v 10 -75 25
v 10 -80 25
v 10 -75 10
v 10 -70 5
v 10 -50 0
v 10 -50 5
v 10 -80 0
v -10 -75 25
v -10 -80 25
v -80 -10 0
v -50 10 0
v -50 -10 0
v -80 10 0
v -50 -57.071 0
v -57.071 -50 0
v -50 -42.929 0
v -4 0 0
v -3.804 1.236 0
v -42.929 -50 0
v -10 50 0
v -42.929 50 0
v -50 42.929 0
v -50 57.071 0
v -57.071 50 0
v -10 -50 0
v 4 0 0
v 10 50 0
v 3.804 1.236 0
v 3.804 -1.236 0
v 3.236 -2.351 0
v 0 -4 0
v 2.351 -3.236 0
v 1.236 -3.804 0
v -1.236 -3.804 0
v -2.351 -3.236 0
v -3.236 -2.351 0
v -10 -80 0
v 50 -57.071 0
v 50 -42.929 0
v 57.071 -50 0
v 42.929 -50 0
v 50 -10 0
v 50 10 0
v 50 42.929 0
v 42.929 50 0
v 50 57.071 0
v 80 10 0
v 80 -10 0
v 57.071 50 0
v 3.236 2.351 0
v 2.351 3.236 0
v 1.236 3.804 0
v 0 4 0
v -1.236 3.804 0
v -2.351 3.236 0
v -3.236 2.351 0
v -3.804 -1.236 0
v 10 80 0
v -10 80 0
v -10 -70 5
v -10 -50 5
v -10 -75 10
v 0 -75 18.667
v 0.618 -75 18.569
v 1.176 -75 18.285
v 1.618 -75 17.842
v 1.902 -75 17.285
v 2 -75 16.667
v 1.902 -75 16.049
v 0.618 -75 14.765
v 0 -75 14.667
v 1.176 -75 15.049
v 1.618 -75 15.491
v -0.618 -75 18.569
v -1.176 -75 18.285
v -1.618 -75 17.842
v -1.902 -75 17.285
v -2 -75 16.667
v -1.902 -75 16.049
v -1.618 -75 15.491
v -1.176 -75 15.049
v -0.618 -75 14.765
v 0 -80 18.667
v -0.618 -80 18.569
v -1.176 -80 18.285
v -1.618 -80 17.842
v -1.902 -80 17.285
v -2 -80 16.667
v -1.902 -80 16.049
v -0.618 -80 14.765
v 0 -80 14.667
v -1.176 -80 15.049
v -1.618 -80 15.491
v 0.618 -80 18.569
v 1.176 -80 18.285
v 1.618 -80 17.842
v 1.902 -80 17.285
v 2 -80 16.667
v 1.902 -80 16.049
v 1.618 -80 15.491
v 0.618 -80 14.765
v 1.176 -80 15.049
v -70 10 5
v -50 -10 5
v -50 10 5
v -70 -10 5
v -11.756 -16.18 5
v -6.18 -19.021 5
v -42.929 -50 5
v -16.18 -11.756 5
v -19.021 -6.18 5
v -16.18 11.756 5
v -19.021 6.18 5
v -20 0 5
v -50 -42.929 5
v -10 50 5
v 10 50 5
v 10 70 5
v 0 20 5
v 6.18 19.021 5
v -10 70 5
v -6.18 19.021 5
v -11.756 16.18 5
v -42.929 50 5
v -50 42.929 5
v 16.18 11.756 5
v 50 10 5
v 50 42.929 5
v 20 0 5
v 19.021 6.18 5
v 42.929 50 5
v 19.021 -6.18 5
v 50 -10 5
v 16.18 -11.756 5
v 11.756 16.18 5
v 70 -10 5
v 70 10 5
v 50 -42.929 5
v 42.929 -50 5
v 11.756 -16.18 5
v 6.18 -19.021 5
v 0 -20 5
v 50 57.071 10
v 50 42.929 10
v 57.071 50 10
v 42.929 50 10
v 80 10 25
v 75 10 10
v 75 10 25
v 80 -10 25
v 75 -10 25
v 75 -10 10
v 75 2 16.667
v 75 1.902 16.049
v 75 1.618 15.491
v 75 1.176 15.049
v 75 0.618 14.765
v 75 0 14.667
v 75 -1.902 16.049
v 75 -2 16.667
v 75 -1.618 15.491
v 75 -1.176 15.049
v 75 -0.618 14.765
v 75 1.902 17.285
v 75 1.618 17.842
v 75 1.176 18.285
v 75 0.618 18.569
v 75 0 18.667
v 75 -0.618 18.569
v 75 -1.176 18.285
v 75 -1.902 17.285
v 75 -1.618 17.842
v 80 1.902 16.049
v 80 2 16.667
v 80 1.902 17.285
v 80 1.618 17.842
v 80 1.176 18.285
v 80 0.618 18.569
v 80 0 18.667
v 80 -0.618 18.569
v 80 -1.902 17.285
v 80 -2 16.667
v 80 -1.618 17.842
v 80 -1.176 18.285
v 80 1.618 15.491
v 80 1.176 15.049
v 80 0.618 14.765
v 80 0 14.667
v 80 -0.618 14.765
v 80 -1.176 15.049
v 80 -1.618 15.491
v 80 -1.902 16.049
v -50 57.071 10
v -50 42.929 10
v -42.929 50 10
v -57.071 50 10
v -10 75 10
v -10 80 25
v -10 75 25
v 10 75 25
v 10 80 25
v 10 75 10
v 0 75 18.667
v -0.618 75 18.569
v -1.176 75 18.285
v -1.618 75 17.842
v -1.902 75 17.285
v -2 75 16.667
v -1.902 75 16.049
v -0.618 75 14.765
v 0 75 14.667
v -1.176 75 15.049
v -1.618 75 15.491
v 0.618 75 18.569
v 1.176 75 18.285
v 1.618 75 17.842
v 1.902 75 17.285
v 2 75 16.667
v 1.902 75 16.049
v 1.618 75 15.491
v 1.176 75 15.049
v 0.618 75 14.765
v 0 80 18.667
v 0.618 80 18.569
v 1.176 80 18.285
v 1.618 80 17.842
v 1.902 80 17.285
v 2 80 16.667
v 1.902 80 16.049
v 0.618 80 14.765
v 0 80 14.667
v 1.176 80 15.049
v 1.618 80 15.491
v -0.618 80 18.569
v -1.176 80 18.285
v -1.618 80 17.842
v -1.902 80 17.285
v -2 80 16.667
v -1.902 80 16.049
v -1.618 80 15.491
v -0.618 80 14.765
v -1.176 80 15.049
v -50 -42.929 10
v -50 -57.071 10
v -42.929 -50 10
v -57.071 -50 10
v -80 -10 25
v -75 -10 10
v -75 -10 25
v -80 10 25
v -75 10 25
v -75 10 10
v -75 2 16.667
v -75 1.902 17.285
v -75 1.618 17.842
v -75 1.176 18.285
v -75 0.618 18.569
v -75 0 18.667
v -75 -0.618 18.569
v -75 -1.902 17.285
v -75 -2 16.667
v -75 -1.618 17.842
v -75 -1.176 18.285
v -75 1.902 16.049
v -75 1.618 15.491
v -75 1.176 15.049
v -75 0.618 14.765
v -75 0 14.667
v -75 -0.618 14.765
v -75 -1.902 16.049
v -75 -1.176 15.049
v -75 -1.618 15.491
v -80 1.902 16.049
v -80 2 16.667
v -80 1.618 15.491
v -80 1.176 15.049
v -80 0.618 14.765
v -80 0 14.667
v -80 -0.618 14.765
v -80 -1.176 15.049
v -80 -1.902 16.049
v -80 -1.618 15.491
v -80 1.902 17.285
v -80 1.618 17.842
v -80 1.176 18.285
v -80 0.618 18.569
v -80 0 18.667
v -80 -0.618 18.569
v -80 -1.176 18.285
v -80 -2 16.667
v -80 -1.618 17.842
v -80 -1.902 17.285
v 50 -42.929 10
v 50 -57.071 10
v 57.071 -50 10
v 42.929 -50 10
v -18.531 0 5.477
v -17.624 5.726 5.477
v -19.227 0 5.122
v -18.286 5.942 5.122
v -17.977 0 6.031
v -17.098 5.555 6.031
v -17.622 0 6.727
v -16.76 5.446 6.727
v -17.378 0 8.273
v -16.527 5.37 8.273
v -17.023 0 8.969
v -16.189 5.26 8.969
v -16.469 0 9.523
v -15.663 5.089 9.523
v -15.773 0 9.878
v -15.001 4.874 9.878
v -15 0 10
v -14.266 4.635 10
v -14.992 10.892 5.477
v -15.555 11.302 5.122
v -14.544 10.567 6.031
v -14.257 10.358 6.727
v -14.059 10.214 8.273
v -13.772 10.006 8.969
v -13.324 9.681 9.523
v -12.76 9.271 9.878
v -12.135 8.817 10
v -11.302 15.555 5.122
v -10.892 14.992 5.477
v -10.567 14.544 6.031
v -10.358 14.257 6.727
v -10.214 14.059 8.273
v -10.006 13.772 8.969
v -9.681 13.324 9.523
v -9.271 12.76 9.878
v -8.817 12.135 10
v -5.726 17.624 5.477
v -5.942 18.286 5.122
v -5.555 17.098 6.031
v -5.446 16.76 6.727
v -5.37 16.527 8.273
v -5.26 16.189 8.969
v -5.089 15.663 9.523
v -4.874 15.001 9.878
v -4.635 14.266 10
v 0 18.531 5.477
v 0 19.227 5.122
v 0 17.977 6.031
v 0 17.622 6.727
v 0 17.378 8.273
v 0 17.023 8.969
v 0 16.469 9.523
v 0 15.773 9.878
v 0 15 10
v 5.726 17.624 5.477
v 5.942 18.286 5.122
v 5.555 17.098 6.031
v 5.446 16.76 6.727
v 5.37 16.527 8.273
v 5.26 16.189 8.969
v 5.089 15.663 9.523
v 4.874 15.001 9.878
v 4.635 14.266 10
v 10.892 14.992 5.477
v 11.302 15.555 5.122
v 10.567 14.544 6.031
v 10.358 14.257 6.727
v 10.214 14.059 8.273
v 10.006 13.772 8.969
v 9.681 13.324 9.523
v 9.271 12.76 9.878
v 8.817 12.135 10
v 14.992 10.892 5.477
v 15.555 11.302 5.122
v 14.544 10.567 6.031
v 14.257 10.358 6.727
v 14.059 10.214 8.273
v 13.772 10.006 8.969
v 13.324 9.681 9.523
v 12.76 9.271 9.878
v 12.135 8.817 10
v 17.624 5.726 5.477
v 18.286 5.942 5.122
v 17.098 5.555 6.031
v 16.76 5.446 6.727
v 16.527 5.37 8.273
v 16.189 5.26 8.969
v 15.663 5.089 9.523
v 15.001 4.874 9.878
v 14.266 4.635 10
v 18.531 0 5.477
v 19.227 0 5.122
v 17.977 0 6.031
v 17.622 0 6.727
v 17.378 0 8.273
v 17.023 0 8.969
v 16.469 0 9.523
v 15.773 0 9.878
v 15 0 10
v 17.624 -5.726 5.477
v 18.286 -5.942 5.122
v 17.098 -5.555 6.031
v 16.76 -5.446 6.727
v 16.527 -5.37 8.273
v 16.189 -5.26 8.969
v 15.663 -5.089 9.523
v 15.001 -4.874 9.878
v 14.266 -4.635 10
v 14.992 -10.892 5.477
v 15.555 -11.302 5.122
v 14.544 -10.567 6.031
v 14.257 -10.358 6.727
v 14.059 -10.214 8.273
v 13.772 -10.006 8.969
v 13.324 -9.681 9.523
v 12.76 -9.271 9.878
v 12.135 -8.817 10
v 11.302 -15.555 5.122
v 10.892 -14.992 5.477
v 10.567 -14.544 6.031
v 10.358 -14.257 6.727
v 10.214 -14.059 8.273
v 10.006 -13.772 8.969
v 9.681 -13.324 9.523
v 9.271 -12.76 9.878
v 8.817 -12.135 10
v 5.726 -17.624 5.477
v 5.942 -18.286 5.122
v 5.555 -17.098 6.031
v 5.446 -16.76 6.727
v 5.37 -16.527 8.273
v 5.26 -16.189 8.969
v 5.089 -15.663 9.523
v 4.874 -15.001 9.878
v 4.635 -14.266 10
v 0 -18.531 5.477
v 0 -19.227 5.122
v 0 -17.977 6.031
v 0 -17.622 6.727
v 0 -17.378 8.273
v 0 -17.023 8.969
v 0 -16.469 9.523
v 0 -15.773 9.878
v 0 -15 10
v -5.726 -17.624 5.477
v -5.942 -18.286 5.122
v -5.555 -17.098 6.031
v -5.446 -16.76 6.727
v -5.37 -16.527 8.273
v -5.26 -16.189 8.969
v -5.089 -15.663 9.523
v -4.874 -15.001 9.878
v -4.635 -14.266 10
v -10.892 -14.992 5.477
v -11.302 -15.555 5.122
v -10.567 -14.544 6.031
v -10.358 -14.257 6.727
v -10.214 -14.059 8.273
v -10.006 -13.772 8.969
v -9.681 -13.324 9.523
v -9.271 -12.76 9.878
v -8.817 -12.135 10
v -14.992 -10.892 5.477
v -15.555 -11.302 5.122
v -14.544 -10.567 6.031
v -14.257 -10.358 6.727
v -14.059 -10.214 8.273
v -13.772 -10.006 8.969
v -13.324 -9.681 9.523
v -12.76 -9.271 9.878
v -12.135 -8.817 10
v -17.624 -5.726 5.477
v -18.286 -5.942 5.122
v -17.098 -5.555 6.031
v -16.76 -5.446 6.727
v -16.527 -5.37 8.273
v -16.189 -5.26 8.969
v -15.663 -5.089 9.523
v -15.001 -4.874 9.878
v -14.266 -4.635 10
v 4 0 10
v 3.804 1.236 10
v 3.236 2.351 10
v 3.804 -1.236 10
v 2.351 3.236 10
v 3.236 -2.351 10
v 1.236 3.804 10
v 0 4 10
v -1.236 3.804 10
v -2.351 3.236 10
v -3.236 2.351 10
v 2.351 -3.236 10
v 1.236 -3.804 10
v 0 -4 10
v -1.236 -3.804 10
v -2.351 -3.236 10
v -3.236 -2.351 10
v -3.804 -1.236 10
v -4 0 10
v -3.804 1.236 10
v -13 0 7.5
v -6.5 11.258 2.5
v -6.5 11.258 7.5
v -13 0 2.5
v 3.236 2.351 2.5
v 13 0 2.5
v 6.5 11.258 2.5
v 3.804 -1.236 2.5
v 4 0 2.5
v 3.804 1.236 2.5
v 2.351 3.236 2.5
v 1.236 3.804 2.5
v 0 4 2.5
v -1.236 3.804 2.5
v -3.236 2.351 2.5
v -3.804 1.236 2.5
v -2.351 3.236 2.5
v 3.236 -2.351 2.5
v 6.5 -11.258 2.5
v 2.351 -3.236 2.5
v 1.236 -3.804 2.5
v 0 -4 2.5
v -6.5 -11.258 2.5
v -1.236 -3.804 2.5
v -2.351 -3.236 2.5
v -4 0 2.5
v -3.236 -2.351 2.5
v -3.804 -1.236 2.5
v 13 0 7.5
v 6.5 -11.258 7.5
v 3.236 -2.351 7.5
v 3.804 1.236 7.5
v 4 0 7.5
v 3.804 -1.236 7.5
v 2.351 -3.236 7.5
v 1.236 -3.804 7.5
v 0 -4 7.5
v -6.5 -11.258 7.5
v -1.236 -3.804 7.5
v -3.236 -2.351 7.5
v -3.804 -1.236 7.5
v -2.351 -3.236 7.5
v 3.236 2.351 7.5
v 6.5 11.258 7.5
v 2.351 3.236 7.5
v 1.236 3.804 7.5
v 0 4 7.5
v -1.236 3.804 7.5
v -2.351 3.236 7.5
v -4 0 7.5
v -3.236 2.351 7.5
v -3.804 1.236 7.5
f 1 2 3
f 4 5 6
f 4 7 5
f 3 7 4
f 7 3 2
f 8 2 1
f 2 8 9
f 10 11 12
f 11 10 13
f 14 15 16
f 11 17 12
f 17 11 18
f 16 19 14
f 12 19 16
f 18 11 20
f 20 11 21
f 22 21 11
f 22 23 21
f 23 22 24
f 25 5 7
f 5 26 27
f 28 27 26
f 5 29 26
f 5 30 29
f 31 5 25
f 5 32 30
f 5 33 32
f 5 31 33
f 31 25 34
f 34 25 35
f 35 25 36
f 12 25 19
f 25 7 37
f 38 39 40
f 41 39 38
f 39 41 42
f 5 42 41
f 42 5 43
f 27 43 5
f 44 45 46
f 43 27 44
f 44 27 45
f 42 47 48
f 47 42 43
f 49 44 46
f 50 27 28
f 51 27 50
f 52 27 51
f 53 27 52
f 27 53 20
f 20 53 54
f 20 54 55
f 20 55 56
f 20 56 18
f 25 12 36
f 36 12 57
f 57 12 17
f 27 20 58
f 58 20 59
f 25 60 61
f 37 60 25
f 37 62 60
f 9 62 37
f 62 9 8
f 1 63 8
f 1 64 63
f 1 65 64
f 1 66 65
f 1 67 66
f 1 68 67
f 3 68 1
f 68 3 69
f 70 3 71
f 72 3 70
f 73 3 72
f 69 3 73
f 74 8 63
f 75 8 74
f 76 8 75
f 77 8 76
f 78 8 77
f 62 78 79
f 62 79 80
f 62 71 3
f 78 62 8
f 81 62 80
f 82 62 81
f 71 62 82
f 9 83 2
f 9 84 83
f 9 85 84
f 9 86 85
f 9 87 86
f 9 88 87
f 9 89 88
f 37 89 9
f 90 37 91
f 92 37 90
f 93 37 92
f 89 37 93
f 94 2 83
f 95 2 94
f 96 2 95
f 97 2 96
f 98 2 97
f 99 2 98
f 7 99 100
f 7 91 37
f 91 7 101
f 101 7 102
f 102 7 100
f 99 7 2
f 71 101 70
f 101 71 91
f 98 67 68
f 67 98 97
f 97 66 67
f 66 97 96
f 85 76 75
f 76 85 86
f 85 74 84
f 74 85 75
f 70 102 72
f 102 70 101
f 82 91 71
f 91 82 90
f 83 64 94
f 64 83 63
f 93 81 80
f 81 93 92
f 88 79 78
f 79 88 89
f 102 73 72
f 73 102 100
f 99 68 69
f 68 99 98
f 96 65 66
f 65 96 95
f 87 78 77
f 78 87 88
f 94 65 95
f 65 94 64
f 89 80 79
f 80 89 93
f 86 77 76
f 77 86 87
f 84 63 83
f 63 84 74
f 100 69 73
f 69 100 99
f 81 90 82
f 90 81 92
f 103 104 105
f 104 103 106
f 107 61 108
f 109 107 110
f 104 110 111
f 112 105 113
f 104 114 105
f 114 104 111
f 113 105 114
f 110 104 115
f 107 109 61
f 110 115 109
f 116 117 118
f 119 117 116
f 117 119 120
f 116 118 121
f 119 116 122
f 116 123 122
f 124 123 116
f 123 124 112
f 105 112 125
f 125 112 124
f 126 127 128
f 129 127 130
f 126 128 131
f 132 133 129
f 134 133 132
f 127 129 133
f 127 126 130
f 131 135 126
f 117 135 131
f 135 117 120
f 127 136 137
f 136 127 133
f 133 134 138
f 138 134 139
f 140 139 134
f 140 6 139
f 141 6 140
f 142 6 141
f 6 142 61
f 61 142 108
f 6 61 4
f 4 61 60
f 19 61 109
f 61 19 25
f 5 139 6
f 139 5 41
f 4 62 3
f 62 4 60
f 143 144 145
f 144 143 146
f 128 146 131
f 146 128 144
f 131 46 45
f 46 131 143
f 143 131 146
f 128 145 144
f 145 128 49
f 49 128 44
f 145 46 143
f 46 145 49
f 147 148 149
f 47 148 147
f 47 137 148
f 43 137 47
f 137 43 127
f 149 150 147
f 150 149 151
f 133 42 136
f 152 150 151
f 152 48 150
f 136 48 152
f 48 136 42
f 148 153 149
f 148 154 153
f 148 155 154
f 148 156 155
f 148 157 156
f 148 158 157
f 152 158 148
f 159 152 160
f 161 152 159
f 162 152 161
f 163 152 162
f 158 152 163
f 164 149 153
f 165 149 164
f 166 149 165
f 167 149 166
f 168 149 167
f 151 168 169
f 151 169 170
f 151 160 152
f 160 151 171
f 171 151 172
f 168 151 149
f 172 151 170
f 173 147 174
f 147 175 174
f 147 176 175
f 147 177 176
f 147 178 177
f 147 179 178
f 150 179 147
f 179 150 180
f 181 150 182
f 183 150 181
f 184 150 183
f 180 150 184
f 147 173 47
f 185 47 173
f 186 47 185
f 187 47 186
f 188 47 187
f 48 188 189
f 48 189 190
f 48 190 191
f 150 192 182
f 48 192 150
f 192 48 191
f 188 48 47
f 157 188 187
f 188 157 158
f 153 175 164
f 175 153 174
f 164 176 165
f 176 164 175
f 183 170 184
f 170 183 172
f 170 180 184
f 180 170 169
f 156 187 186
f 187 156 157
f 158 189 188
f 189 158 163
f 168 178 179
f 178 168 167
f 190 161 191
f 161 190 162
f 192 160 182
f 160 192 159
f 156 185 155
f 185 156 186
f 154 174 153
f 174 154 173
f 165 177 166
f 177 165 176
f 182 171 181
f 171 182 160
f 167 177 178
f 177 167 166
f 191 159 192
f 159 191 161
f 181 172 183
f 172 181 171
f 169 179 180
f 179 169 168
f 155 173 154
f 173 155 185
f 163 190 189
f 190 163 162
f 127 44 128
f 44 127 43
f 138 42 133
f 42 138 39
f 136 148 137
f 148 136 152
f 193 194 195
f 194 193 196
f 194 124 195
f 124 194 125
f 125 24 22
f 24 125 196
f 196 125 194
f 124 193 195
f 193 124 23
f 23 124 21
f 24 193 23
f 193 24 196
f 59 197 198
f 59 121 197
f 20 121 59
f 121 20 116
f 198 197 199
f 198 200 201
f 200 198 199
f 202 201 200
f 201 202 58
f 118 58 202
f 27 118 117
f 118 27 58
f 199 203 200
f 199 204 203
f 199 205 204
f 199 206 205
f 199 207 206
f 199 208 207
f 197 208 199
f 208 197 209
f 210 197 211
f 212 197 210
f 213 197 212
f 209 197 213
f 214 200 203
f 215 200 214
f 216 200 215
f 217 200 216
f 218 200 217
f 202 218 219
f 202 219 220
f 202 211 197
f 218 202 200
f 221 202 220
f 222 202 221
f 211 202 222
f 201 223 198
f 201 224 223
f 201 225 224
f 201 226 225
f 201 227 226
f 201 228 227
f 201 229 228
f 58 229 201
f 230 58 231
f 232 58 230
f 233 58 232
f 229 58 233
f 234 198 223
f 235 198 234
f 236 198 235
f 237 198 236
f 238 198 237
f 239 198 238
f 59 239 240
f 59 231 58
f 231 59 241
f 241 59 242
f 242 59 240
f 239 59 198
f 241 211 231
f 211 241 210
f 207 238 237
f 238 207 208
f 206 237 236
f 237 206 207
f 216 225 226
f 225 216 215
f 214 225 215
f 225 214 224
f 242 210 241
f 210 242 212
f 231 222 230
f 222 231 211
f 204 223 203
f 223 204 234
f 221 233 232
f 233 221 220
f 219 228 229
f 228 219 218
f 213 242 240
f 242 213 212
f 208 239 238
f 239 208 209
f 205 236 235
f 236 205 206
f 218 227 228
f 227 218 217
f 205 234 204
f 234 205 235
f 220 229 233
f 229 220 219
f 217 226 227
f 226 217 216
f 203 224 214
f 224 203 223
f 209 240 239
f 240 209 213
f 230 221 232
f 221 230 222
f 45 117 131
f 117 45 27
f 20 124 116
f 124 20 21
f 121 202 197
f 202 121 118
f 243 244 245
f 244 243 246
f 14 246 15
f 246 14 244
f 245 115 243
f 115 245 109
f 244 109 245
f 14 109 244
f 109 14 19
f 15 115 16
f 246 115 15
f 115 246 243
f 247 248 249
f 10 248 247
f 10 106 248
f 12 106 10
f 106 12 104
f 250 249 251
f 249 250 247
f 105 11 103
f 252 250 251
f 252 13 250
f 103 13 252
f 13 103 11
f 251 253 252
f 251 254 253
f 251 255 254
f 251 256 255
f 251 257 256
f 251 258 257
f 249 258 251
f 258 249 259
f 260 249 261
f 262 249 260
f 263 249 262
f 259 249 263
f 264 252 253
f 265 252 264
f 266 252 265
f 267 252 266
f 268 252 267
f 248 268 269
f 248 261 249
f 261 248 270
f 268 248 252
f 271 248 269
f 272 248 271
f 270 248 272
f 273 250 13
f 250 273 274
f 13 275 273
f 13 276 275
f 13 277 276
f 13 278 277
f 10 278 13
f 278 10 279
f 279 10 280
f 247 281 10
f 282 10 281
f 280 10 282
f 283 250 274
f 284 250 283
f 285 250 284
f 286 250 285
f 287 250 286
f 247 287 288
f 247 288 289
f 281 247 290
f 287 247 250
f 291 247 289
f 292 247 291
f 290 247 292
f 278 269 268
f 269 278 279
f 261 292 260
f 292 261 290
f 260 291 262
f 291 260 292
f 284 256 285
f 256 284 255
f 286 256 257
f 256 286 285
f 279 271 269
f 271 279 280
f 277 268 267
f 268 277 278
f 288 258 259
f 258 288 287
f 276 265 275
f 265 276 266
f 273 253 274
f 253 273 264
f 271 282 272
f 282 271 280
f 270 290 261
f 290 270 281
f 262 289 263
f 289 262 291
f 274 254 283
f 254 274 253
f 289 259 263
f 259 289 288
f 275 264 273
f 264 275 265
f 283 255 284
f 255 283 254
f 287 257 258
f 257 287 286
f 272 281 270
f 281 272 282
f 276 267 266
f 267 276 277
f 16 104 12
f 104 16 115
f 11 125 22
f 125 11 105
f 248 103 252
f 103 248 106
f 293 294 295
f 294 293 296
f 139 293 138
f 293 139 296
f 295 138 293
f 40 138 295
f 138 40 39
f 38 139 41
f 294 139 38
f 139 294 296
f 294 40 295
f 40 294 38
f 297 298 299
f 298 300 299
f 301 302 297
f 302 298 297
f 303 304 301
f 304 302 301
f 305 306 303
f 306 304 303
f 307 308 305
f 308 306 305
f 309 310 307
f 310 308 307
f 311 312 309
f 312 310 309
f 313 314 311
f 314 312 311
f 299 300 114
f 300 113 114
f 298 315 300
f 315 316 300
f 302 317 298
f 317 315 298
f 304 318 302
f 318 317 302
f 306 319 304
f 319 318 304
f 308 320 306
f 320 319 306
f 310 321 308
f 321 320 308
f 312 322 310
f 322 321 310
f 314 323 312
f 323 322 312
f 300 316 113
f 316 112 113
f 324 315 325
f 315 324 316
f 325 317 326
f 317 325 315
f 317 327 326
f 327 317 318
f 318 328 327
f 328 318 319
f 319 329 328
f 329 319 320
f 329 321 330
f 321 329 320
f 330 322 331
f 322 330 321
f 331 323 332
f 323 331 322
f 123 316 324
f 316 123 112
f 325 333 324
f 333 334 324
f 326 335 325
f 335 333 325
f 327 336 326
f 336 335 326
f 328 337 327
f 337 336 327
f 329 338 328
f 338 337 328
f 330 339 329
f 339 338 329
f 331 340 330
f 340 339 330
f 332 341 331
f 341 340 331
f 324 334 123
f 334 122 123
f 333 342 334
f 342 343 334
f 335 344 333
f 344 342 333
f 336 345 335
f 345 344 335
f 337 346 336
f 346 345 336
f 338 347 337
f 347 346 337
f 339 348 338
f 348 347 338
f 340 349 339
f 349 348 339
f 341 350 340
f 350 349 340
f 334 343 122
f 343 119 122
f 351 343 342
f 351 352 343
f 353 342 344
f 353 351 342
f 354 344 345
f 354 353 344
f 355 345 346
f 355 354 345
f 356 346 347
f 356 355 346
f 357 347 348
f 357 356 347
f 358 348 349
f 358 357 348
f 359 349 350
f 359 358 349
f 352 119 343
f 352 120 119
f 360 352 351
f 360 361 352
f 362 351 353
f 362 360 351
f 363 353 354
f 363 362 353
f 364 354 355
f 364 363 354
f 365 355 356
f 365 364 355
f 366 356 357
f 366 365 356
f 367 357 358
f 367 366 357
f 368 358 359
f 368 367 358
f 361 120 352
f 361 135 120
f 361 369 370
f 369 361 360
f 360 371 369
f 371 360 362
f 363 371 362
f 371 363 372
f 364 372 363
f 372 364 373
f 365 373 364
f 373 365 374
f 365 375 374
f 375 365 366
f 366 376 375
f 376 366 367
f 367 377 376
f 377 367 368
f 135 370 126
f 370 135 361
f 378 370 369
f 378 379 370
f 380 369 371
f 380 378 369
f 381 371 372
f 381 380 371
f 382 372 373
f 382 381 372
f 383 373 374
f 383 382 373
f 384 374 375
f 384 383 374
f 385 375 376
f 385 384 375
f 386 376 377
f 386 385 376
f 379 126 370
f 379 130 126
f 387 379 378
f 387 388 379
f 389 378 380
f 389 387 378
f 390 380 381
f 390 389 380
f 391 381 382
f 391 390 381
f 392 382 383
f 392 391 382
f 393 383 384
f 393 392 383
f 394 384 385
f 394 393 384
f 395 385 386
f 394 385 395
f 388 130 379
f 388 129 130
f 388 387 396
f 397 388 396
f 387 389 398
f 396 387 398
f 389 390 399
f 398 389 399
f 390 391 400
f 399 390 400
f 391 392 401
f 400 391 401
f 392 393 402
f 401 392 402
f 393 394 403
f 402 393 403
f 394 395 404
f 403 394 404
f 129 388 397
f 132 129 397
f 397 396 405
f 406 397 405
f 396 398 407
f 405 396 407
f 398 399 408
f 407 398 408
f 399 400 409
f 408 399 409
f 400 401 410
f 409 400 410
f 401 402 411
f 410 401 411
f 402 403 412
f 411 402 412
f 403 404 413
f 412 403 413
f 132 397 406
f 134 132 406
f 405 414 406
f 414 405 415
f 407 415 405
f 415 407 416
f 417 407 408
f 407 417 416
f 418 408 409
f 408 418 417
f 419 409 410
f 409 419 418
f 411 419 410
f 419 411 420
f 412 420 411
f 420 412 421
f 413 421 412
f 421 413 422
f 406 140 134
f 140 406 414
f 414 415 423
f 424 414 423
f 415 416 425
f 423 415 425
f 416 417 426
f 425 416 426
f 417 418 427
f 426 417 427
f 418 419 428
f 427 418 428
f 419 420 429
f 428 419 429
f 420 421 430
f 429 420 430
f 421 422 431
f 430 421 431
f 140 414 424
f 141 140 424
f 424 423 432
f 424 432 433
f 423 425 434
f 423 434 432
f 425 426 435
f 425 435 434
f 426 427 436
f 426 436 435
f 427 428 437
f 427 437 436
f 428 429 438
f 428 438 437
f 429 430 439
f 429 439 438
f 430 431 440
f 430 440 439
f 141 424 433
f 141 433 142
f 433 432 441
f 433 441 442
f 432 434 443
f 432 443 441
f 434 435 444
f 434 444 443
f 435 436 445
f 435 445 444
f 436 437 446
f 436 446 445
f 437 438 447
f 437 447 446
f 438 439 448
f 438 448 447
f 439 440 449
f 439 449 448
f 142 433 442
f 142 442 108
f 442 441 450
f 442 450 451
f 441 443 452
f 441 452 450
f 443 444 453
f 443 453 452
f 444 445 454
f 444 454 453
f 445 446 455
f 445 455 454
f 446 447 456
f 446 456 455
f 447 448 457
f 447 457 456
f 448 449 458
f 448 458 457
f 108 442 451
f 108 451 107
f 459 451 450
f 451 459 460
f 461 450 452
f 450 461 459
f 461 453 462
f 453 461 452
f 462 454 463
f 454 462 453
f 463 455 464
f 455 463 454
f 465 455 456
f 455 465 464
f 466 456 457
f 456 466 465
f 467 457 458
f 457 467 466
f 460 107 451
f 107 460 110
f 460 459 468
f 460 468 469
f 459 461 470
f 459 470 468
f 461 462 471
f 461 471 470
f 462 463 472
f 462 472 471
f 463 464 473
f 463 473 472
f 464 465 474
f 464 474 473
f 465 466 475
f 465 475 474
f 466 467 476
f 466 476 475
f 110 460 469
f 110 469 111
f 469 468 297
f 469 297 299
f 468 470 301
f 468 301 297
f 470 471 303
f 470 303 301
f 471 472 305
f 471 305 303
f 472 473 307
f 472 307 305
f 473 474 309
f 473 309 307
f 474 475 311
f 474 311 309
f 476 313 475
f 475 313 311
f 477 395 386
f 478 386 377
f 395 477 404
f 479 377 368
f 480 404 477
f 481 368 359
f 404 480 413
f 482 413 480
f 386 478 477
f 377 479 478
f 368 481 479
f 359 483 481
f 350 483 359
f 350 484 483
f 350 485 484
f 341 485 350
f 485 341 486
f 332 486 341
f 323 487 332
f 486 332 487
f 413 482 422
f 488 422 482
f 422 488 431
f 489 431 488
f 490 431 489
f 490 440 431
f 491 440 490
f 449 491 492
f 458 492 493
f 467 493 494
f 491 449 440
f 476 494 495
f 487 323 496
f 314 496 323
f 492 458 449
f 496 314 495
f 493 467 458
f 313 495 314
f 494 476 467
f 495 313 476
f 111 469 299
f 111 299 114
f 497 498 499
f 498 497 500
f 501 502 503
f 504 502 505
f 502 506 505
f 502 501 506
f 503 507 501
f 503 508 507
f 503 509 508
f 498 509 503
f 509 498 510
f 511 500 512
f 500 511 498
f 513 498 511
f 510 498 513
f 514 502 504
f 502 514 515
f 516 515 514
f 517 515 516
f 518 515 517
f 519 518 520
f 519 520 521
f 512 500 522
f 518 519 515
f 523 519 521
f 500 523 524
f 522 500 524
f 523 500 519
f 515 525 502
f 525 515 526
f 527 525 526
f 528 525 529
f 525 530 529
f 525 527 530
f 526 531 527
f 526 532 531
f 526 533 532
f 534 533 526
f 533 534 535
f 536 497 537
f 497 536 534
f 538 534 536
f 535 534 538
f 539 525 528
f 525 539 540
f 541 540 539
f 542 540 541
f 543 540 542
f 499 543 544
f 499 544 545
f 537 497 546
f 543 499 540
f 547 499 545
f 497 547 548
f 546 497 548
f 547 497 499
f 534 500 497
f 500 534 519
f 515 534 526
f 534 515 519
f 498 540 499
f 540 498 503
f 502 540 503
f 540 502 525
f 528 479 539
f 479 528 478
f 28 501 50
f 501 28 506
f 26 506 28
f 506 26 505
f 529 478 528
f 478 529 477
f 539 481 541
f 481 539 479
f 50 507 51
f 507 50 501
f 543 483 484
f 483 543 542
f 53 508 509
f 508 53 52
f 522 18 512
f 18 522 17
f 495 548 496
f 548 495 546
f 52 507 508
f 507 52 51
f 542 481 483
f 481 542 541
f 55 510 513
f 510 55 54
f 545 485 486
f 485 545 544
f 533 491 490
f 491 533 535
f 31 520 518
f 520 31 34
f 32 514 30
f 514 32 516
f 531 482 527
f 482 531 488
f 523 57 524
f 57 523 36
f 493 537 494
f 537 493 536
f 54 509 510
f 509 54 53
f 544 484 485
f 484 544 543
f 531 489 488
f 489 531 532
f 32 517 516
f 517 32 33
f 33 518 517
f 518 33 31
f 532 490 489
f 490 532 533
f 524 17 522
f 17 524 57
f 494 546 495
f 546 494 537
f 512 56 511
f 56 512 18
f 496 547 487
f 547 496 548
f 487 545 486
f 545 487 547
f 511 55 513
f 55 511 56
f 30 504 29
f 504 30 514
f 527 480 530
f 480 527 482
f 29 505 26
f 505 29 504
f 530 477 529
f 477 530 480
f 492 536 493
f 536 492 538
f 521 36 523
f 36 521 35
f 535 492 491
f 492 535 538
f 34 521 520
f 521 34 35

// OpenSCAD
taille = 100;
tailleGuide = 10;
epaisseur = 5;

difference() {
	union() {
		translate([-taille / 2, -taille / 2,0]) cube([taille, taille, epaisseur]);
		for (i = [0 : 3]) {
			rotate(a = i * 90) {
				translate(v = [taille / 2, taille / 2, 0]) {
					rotate(a = 45) {
						translate([-tailleGuide / 2, -tailleGuide / 2,0]) {
							cube([tailleGuide, tailleGuide, 2 * epaisseur]);
						}
					}
				}
				translate(v = [0, -taille / 2, 0]) {
					patteAccroche(20, 30, 25, epaisseur); // Largeur, Longueur, Hauteur, Epaisseur
				}
			}
		}
		translate([0, 0, epaisseur]) {
			renfort(20, epaisseur);
		}
	}
	translate([0, 0, epaisseur]) {
		ecrou(13, 5);
	}
}

module ecrou(tailleEcrou, epaisseurEcrou) {
	union() {
		linear_extrude(height = epaisseurEcrou, center = true, convexity = 10, twist = 0)
		polygon(points =	[ [tailleEcrou, 0], [tailleEcrou * cos(60) , tailleEcrou * sin(60)], 
						[tailleEcrou * cos(120) , tailleEcrou * sin(120)], 
						[tailleEcrou * cos(180) , tailleEcrou * sin(180)], 
						[tailleEcrou * cos(240) , tailleEcrou * sin(240)], 
						[tailleEcrou * cos(300) , tailleEcrou * sin(300)]]);
		translate(v = [0, 0, -10]) {		
			cylinder(h=20, r=tailleEcrou * (4 / 13),$fn=20);
		}
	}
}

module patteAccroche(largeur, longueur , hauteur, epaisseur) {
	translate([-largeur / 2, - longueur, 0]) {
		union() {
			cube([largeur, longueur, epaisseur]);
			difference() {
				cube(size = [largeur, epaisseur, hauteur]);
				translate ([largeur / 2, 0, 2 * hauteur / 3]) 
				rotate ([90,0,0]) cylinder (h = 20, r = 2, center = true, $fn = 20);
			}
			polyhedron(
				points =	[ [0,epaisseur,epaisseur], [0, 2 * epaisseur, epaisseur],
						[0, epaisseur, 2 * epaisseur], [largeur,epaisseur,epaisseur],
						[largeur, 2 * epaisseur, epaisseur], [largeur, epaisseur, 2 * epaisseur]  ],
				triangles = 	[ [0, 1, 2], [3, 5, 4], [0, 2, 3], [2, 5, 3], [1, 4, 5], [1, 5, 2] ,
						[1, 0, 4], [4, 0, 3] ]
			);
		}
	}
}

module renfort(diametre, epaisseur) {
	translate([0,0, epaisseur / 2]) {
		rotate_extrude(convexity = 10, $fn = 20) {
			difference() {
				union() {
					translate([(diametre - epaisseur) / 2, 0, 0]) square([diametre - epaisseur, epaisseur], true);
					translate([(diametre - epaisseur) , 0, 0]) circle(epaisseur / 2, $fn = 20);
					translate([(diametre - epaisseur), -epaisseur /2, 0]) square([epaisseur, epaisseur /2]);
				}
				translate([diametre, 0, 0]) circle(epaisseur / 2, $fn = 20);
			}
		}
	}
}
